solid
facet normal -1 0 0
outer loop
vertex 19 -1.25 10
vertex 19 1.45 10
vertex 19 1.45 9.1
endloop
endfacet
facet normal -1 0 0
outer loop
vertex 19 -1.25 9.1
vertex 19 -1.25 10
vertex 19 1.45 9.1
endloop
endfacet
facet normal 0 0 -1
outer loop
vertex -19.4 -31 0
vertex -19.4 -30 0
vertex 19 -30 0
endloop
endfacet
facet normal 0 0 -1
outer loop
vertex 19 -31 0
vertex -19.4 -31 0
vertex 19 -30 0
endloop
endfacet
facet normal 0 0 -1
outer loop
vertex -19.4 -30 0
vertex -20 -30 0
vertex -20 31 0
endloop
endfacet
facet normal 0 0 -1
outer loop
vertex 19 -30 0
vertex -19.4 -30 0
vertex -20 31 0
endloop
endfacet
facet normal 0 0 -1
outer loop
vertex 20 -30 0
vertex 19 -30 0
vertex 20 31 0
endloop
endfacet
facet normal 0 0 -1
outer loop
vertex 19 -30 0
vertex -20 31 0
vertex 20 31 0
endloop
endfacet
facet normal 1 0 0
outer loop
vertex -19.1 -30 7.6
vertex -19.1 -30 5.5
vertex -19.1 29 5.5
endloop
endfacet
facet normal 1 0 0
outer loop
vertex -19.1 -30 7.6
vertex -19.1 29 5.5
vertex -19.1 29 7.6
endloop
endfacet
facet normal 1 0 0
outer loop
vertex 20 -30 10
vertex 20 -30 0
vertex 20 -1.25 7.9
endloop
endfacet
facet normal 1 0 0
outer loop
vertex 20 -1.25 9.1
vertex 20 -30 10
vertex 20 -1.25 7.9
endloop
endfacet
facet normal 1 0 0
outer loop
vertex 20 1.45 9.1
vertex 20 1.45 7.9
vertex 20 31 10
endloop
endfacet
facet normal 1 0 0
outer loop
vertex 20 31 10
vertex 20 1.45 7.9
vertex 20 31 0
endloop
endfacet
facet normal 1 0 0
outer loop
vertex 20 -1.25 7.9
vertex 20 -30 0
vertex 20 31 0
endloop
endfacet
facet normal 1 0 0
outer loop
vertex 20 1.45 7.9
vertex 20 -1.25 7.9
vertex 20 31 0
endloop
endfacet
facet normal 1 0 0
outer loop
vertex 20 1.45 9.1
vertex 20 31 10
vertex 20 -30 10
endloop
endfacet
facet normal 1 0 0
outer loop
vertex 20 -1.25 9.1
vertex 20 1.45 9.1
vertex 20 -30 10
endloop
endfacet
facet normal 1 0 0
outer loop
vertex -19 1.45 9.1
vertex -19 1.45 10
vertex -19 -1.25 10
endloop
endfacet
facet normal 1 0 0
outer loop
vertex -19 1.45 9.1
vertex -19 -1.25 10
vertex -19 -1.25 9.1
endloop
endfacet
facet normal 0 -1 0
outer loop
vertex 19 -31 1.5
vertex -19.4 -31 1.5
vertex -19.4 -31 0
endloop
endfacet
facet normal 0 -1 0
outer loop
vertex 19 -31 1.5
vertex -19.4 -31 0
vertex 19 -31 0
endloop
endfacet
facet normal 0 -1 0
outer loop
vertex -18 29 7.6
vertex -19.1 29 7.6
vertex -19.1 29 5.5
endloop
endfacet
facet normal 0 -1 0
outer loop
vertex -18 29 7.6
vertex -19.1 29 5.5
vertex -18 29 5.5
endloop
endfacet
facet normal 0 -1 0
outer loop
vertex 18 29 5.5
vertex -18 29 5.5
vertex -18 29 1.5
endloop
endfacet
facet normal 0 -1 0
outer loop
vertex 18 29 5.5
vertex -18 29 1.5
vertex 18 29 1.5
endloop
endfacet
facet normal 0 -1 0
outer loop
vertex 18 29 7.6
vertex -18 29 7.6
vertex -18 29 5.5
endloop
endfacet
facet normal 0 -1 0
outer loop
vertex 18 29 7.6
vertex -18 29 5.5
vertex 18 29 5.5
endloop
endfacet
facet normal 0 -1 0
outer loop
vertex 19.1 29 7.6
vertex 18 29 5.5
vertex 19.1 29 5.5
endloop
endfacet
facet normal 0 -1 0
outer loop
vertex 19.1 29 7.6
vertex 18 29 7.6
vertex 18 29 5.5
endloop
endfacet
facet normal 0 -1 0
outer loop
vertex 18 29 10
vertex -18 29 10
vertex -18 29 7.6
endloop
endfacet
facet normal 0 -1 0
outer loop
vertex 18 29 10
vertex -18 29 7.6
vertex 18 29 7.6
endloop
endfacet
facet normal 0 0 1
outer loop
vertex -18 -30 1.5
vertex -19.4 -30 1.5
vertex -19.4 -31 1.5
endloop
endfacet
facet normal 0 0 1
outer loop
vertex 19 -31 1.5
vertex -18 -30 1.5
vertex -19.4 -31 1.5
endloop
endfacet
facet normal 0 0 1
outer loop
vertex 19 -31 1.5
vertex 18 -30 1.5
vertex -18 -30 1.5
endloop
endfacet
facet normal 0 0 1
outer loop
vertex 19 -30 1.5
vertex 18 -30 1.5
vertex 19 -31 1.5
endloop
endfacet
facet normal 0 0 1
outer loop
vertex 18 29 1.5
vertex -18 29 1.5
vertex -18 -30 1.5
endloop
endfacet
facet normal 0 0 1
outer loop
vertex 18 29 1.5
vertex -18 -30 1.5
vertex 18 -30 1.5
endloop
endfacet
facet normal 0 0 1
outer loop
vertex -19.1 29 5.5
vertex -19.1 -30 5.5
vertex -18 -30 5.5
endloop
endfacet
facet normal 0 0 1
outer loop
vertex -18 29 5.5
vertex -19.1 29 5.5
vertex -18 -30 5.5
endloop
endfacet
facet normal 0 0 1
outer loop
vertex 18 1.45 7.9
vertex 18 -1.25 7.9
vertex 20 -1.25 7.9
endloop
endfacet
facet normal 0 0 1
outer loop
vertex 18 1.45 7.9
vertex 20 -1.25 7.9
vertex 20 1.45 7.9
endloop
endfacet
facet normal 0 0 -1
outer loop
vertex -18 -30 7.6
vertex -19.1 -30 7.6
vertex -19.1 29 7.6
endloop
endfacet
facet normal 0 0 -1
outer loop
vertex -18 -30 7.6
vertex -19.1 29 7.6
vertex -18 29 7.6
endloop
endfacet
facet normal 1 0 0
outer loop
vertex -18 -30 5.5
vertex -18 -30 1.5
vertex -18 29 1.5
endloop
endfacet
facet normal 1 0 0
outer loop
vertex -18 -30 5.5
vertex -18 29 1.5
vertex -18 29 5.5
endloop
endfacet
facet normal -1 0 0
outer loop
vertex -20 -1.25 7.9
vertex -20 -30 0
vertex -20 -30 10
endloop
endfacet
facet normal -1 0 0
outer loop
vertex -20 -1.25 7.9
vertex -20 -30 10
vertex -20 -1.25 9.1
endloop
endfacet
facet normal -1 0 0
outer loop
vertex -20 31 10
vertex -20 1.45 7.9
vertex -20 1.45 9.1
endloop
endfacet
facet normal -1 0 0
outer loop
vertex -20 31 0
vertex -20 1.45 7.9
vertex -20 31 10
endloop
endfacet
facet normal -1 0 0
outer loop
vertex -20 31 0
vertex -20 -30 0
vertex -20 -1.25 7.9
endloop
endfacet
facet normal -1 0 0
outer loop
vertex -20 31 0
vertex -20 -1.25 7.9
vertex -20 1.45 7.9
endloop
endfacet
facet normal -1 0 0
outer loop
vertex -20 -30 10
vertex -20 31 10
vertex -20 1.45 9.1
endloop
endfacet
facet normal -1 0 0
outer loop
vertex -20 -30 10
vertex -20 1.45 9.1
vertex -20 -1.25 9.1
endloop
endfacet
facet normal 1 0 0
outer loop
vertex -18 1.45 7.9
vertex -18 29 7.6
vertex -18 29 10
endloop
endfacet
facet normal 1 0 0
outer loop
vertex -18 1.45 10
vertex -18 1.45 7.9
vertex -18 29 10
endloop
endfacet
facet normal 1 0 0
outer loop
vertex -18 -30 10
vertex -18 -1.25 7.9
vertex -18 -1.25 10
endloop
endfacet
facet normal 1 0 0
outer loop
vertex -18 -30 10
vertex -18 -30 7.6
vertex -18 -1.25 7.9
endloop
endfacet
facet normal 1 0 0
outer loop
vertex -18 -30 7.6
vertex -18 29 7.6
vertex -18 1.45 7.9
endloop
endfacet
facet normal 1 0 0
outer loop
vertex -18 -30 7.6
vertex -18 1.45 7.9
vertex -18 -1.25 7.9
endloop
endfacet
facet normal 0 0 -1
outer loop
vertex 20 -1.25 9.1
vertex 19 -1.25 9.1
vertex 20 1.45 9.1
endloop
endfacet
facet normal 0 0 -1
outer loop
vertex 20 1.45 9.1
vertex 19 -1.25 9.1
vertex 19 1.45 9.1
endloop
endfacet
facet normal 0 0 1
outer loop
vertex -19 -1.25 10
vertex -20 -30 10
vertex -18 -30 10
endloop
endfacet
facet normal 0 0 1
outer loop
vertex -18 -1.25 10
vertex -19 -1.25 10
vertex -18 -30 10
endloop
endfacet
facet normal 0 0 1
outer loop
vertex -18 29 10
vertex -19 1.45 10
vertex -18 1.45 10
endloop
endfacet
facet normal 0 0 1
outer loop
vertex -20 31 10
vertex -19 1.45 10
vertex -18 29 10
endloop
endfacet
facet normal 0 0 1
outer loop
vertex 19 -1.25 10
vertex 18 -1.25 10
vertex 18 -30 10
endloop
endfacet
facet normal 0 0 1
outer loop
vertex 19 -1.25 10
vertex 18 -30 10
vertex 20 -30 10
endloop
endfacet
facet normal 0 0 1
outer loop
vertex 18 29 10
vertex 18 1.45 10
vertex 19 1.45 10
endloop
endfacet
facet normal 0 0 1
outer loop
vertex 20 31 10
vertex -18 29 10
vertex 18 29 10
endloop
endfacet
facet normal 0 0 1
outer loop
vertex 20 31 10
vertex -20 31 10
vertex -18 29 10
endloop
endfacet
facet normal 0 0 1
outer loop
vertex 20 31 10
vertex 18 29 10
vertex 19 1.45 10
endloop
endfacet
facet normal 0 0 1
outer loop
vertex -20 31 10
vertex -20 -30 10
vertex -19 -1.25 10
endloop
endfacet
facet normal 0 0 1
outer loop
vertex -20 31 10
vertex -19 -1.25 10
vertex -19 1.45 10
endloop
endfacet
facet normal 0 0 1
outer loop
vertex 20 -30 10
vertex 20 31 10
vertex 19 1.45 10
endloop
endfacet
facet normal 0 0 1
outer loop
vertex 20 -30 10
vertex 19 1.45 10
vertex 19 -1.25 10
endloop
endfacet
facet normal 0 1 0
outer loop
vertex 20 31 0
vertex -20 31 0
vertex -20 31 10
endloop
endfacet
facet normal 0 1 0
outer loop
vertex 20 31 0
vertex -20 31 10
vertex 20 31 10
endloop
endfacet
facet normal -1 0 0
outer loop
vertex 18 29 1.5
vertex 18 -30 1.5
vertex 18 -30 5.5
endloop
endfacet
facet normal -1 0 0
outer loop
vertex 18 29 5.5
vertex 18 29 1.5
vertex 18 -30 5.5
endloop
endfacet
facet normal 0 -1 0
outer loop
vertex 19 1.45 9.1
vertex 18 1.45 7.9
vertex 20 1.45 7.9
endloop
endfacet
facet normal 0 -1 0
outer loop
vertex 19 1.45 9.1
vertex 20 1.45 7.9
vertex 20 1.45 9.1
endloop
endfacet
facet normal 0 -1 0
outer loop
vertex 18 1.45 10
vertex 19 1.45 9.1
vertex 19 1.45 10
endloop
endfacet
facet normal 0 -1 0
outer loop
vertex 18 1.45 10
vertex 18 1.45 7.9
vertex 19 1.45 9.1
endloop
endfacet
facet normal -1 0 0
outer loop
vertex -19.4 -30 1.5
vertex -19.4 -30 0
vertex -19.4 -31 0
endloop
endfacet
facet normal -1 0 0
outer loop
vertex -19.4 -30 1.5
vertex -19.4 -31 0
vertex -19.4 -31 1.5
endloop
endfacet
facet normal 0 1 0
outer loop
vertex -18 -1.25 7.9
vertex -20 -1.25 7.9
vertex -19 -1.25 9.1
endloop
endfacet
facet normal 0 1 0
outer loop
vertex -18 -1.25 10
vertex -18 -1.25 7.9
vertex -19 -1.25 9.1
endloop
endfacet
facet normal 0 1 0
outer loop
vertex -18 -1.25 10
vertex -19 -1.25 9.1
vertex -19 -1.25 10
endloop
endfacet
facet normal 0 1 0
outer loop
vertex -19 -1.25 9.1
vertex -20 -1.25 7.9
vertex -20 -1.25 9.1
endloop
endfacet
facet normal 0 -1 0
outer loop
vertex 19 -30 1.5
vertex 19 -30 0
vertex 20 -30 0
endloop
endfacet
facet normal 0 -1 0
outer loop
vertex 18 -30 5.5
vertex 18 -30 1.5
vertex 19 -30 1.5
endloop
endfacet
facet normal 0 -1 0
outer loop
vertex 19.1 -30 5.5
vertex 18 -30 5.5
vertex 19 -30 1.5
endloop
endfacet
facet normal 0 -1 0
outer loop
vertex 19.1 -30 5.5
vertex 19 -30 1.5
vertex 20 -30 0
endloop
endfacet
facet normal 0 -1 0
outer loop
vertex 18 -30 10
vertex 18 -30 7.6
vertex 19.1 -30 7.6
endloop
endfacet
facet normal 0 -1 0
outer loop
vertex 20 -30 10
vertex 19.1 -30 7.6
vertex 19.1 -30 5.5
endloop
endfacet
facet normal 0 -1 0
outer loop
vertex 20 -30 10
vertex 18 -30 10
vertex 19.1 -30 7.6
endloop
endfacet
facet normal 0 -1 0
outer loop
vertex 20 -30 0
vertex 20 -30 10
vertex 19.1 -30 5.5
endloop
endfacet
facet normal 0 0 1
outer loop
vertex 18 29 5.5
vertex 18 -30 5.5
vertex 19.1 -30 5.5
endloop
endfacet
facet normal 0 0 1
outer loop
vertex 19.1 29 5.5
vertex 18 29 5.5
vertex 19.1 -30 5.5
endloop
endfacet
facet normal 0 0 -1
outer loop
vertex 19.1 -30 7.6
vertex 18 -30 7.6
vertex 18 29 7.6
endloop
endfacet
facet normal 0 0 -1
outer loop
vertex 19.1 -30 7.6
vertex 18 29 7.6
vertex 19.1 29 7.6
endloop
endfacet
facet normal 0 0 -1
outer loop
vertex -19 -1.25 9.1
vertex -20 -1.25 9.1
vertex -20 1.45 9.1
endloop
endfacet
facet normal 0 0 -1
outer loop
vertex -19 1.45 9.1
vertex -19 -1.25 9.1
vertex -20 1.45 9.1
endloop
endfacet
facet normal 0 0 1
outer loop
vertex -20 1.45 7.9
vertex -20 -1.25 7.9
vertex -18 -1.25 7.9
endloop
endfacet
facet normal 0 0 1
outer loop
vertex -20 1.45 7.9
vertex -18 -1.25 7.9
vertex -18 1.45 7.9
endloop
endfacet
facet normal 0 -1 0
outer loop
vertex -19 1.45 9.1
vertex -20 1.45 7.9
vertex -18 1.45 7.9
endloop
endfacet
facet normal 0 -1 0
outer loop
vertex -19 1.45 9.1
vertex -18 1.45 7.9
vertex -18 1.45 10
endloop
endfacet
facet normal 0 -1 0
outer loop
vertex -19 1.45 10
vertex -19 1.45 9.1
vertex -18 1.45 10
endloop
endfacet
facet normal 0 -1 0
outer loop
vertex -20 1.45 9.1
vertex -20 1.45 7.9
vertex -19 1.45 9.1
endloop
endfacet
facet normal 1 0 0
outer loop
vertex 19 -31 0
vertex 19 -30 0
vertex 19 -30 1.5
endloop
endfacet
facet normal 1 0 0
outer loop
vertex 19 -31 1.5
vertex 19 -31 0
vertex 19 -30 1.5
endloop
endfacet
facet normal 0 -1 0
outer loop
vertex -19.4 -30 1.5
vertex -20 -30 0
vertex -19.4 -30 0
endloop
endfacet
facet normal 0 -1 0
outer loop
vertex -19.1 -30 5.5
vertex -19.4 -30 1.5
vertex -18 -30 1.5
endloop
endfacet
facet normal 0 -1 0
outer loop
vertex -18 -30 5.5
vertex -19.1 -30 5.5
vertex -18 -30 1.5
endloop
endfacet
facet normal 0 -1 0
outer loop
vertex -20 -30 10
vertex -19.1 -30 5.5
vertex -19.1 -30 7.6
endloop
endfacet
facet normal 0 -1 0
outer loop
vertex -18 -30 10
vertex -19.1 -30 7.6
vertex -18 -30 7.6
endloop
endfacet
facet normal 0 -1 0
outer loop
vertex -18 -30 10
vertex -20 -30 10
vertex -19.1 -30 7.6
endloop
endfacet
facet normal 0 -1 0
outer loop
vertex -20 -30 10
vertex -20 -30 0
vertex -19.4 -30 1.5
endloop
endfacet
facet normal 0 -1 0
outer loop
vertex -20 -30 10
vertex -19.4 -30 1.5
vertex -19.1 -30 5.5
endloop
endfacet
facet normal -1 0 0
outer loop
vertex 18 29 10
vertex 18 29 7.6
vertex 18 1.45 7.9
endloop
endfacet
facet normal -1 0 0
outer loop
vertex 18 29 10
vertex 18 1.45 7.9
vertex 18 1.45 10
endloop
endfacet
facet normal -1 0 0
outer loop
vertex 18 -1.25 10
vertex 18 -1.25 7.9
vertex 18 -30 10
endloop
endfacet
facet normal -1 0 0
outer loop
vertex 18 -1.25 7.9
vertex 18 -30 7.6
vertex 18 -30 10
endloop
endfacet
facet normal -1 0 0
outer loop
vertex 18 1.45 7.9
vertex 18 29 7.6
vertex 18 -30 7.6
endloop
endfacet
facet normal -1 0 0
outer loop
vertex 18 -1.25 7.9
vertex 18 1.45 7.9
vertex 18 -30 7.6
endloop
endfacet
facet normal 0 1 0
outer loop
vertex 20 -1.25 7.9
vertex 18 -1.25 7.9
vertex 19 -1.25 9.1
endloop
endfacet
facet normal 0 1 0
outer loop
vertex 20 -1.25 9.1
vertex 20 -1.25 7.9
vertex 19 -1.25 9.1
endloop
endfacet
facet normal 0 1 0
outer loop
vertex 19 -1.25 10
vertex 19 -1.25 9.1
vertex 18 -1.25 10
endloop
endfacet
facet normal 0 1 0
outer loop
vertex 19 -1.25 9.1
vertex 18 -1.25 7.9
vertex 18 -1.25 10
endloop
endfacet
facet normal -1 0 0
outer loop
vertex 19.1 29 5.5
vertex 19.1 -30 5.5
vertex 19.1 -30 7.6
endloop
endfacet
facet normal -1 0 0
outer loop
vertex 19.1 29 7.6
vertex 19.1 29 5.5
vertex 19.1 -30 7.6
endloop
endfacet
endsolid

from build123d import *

# Parameters (mm, degrees)
SKETCH_1_W          = 40
SKETCH_1_H          = 62
EXTRUDE_1_DEPTH     = 10
SKETCH_2_W          = 36
SKETCH_2_H          = 58
CUT_EXTRUDE_1_DEPTH = 8.5
SKETCH_4_W          = 36
SKETCH_4_H          = 8.5
CUT_EXTRUDE_2_DEPTH = 2
SKETCH_5_W          = 38.2
SKETCH_5_H          = 2.1
CUT_EXTRUDE_3_DEPTH = 60
SKETCH_6_W          = 40
SKETCH_6_H          = 10
CUT_EXTRUDE_4_DEPTH = 1
SKETCH_7_W          = 38.4
SKETCH_7_H          = 1.5
EXTRUDE_2_DEPTH     = 1
SKETCH_8_W          = 1.2
SKETCH_8_H          = 2.7
CUT_EXTRUDE_5_DEPTH = 52.584881506
SKETCH_10_W         = 0.9
SKETCH_10_H         = 2.7
CUT_EXTRUDE_6_DEPTH = 1


with BuildPart() as part:
    # 草图1 → 凸台-拉伸1 (new body)
    with BuildSketch(Plane.XY):
        Rectangle(SKETCH_1_W, SKETCH_1_H)
    extrude(amount=EXTRUDE_1_DEPTH)

    # 草图2 → 切除-拉伸1 (cut)
    with BuildSketch(Plane.XY.offset(10)):
        Rectangle(SKETCH_2_W, SKETCH_2_H)
    extrude(amount=-CUT_EXTRUDE_1_DEPTH, mode=Mode.SUBTRACT)

    # 草图4 → 切除-拉伸2 (cut)
    with BuildSketch(Plane.XZ.offset(31)):
        with Locations((0, 5.75)):
            Rectangle(SKETCH_4_W, SKETCH_4_H)
    extrude(amount=-CUT_EXTRUDE_2_DEPTH, mode=Mode.SUBTRACT)

    # 草图5 → 切除-拉伸3 (cut)
    with BuildSketch(Plane.XZ.offset(31)):
        with Locations((0, 6.55)):
            Rectangle(SKETCH_5_W, SKETCH_5_H)
    extrude(amount=-CUT_EXTRUDE_3_DEPTH, mode=Mode.SUBTRACT)

    # 草图6 → 切除-拉伸4 (cut)
    with BuildSketch(Plane.XZ.offset(31)):
        with Locations((0, 5)):
            Rectangle(SKETCH_6_W, SKETCH_6_H)
    extrude(amount=-CUT_EXTRUDE_4_DEPTH, mode=Mode.SUBTRACT)

    # 草图7 → 凸台-拉伸2 (add)
    with BuildSketch(Plane.XZ.offset(30)):
        with Locations((-0.2, 0.75)):
            Rectangle(SKETCH_7_W, SKETCH_7_H)
    extrude(amount=EXTRUDE_2_DEPTH)

    # 草图8 → 切除-拉伸5 (cut, through all)
    with BuildSketch(Plane.ZY.offset(20)):
        with Locations((8.5, 0.1)):
            Rectangle(SKETCH_8_W, SKETCH_8_H)
    extrude(amount=-CUT_EXTRUDE_5_DEPTH, mode=Mode.SUBTRACT)

    # 草图10 → 切除-拉伸6 (cut)
    with BuildSketch(Plane(origin=(-18, 0, 0), x_dir=(0, 0, -1), z_dir=(1, 0, 0))):
        with Locations((-9.55, 0.1)):
            Rectangle(SKETCH_10_W, SKETCH_10_H)
    cut_extrude_6 = extrude(amount=-CUT_EXTRUDE_6_DEPTH, mode=Mode.SUBTRACT)

    # 镜向1: 切除-拉伸6 across plane
    add(cut_extrude_6.mirror(Plane(origin=(0, 0, 0), x_dir=(0, 0, 1), z_dir=(1, 0, 0))), mode=Mode.SUBTRACT)


solid = part.part
